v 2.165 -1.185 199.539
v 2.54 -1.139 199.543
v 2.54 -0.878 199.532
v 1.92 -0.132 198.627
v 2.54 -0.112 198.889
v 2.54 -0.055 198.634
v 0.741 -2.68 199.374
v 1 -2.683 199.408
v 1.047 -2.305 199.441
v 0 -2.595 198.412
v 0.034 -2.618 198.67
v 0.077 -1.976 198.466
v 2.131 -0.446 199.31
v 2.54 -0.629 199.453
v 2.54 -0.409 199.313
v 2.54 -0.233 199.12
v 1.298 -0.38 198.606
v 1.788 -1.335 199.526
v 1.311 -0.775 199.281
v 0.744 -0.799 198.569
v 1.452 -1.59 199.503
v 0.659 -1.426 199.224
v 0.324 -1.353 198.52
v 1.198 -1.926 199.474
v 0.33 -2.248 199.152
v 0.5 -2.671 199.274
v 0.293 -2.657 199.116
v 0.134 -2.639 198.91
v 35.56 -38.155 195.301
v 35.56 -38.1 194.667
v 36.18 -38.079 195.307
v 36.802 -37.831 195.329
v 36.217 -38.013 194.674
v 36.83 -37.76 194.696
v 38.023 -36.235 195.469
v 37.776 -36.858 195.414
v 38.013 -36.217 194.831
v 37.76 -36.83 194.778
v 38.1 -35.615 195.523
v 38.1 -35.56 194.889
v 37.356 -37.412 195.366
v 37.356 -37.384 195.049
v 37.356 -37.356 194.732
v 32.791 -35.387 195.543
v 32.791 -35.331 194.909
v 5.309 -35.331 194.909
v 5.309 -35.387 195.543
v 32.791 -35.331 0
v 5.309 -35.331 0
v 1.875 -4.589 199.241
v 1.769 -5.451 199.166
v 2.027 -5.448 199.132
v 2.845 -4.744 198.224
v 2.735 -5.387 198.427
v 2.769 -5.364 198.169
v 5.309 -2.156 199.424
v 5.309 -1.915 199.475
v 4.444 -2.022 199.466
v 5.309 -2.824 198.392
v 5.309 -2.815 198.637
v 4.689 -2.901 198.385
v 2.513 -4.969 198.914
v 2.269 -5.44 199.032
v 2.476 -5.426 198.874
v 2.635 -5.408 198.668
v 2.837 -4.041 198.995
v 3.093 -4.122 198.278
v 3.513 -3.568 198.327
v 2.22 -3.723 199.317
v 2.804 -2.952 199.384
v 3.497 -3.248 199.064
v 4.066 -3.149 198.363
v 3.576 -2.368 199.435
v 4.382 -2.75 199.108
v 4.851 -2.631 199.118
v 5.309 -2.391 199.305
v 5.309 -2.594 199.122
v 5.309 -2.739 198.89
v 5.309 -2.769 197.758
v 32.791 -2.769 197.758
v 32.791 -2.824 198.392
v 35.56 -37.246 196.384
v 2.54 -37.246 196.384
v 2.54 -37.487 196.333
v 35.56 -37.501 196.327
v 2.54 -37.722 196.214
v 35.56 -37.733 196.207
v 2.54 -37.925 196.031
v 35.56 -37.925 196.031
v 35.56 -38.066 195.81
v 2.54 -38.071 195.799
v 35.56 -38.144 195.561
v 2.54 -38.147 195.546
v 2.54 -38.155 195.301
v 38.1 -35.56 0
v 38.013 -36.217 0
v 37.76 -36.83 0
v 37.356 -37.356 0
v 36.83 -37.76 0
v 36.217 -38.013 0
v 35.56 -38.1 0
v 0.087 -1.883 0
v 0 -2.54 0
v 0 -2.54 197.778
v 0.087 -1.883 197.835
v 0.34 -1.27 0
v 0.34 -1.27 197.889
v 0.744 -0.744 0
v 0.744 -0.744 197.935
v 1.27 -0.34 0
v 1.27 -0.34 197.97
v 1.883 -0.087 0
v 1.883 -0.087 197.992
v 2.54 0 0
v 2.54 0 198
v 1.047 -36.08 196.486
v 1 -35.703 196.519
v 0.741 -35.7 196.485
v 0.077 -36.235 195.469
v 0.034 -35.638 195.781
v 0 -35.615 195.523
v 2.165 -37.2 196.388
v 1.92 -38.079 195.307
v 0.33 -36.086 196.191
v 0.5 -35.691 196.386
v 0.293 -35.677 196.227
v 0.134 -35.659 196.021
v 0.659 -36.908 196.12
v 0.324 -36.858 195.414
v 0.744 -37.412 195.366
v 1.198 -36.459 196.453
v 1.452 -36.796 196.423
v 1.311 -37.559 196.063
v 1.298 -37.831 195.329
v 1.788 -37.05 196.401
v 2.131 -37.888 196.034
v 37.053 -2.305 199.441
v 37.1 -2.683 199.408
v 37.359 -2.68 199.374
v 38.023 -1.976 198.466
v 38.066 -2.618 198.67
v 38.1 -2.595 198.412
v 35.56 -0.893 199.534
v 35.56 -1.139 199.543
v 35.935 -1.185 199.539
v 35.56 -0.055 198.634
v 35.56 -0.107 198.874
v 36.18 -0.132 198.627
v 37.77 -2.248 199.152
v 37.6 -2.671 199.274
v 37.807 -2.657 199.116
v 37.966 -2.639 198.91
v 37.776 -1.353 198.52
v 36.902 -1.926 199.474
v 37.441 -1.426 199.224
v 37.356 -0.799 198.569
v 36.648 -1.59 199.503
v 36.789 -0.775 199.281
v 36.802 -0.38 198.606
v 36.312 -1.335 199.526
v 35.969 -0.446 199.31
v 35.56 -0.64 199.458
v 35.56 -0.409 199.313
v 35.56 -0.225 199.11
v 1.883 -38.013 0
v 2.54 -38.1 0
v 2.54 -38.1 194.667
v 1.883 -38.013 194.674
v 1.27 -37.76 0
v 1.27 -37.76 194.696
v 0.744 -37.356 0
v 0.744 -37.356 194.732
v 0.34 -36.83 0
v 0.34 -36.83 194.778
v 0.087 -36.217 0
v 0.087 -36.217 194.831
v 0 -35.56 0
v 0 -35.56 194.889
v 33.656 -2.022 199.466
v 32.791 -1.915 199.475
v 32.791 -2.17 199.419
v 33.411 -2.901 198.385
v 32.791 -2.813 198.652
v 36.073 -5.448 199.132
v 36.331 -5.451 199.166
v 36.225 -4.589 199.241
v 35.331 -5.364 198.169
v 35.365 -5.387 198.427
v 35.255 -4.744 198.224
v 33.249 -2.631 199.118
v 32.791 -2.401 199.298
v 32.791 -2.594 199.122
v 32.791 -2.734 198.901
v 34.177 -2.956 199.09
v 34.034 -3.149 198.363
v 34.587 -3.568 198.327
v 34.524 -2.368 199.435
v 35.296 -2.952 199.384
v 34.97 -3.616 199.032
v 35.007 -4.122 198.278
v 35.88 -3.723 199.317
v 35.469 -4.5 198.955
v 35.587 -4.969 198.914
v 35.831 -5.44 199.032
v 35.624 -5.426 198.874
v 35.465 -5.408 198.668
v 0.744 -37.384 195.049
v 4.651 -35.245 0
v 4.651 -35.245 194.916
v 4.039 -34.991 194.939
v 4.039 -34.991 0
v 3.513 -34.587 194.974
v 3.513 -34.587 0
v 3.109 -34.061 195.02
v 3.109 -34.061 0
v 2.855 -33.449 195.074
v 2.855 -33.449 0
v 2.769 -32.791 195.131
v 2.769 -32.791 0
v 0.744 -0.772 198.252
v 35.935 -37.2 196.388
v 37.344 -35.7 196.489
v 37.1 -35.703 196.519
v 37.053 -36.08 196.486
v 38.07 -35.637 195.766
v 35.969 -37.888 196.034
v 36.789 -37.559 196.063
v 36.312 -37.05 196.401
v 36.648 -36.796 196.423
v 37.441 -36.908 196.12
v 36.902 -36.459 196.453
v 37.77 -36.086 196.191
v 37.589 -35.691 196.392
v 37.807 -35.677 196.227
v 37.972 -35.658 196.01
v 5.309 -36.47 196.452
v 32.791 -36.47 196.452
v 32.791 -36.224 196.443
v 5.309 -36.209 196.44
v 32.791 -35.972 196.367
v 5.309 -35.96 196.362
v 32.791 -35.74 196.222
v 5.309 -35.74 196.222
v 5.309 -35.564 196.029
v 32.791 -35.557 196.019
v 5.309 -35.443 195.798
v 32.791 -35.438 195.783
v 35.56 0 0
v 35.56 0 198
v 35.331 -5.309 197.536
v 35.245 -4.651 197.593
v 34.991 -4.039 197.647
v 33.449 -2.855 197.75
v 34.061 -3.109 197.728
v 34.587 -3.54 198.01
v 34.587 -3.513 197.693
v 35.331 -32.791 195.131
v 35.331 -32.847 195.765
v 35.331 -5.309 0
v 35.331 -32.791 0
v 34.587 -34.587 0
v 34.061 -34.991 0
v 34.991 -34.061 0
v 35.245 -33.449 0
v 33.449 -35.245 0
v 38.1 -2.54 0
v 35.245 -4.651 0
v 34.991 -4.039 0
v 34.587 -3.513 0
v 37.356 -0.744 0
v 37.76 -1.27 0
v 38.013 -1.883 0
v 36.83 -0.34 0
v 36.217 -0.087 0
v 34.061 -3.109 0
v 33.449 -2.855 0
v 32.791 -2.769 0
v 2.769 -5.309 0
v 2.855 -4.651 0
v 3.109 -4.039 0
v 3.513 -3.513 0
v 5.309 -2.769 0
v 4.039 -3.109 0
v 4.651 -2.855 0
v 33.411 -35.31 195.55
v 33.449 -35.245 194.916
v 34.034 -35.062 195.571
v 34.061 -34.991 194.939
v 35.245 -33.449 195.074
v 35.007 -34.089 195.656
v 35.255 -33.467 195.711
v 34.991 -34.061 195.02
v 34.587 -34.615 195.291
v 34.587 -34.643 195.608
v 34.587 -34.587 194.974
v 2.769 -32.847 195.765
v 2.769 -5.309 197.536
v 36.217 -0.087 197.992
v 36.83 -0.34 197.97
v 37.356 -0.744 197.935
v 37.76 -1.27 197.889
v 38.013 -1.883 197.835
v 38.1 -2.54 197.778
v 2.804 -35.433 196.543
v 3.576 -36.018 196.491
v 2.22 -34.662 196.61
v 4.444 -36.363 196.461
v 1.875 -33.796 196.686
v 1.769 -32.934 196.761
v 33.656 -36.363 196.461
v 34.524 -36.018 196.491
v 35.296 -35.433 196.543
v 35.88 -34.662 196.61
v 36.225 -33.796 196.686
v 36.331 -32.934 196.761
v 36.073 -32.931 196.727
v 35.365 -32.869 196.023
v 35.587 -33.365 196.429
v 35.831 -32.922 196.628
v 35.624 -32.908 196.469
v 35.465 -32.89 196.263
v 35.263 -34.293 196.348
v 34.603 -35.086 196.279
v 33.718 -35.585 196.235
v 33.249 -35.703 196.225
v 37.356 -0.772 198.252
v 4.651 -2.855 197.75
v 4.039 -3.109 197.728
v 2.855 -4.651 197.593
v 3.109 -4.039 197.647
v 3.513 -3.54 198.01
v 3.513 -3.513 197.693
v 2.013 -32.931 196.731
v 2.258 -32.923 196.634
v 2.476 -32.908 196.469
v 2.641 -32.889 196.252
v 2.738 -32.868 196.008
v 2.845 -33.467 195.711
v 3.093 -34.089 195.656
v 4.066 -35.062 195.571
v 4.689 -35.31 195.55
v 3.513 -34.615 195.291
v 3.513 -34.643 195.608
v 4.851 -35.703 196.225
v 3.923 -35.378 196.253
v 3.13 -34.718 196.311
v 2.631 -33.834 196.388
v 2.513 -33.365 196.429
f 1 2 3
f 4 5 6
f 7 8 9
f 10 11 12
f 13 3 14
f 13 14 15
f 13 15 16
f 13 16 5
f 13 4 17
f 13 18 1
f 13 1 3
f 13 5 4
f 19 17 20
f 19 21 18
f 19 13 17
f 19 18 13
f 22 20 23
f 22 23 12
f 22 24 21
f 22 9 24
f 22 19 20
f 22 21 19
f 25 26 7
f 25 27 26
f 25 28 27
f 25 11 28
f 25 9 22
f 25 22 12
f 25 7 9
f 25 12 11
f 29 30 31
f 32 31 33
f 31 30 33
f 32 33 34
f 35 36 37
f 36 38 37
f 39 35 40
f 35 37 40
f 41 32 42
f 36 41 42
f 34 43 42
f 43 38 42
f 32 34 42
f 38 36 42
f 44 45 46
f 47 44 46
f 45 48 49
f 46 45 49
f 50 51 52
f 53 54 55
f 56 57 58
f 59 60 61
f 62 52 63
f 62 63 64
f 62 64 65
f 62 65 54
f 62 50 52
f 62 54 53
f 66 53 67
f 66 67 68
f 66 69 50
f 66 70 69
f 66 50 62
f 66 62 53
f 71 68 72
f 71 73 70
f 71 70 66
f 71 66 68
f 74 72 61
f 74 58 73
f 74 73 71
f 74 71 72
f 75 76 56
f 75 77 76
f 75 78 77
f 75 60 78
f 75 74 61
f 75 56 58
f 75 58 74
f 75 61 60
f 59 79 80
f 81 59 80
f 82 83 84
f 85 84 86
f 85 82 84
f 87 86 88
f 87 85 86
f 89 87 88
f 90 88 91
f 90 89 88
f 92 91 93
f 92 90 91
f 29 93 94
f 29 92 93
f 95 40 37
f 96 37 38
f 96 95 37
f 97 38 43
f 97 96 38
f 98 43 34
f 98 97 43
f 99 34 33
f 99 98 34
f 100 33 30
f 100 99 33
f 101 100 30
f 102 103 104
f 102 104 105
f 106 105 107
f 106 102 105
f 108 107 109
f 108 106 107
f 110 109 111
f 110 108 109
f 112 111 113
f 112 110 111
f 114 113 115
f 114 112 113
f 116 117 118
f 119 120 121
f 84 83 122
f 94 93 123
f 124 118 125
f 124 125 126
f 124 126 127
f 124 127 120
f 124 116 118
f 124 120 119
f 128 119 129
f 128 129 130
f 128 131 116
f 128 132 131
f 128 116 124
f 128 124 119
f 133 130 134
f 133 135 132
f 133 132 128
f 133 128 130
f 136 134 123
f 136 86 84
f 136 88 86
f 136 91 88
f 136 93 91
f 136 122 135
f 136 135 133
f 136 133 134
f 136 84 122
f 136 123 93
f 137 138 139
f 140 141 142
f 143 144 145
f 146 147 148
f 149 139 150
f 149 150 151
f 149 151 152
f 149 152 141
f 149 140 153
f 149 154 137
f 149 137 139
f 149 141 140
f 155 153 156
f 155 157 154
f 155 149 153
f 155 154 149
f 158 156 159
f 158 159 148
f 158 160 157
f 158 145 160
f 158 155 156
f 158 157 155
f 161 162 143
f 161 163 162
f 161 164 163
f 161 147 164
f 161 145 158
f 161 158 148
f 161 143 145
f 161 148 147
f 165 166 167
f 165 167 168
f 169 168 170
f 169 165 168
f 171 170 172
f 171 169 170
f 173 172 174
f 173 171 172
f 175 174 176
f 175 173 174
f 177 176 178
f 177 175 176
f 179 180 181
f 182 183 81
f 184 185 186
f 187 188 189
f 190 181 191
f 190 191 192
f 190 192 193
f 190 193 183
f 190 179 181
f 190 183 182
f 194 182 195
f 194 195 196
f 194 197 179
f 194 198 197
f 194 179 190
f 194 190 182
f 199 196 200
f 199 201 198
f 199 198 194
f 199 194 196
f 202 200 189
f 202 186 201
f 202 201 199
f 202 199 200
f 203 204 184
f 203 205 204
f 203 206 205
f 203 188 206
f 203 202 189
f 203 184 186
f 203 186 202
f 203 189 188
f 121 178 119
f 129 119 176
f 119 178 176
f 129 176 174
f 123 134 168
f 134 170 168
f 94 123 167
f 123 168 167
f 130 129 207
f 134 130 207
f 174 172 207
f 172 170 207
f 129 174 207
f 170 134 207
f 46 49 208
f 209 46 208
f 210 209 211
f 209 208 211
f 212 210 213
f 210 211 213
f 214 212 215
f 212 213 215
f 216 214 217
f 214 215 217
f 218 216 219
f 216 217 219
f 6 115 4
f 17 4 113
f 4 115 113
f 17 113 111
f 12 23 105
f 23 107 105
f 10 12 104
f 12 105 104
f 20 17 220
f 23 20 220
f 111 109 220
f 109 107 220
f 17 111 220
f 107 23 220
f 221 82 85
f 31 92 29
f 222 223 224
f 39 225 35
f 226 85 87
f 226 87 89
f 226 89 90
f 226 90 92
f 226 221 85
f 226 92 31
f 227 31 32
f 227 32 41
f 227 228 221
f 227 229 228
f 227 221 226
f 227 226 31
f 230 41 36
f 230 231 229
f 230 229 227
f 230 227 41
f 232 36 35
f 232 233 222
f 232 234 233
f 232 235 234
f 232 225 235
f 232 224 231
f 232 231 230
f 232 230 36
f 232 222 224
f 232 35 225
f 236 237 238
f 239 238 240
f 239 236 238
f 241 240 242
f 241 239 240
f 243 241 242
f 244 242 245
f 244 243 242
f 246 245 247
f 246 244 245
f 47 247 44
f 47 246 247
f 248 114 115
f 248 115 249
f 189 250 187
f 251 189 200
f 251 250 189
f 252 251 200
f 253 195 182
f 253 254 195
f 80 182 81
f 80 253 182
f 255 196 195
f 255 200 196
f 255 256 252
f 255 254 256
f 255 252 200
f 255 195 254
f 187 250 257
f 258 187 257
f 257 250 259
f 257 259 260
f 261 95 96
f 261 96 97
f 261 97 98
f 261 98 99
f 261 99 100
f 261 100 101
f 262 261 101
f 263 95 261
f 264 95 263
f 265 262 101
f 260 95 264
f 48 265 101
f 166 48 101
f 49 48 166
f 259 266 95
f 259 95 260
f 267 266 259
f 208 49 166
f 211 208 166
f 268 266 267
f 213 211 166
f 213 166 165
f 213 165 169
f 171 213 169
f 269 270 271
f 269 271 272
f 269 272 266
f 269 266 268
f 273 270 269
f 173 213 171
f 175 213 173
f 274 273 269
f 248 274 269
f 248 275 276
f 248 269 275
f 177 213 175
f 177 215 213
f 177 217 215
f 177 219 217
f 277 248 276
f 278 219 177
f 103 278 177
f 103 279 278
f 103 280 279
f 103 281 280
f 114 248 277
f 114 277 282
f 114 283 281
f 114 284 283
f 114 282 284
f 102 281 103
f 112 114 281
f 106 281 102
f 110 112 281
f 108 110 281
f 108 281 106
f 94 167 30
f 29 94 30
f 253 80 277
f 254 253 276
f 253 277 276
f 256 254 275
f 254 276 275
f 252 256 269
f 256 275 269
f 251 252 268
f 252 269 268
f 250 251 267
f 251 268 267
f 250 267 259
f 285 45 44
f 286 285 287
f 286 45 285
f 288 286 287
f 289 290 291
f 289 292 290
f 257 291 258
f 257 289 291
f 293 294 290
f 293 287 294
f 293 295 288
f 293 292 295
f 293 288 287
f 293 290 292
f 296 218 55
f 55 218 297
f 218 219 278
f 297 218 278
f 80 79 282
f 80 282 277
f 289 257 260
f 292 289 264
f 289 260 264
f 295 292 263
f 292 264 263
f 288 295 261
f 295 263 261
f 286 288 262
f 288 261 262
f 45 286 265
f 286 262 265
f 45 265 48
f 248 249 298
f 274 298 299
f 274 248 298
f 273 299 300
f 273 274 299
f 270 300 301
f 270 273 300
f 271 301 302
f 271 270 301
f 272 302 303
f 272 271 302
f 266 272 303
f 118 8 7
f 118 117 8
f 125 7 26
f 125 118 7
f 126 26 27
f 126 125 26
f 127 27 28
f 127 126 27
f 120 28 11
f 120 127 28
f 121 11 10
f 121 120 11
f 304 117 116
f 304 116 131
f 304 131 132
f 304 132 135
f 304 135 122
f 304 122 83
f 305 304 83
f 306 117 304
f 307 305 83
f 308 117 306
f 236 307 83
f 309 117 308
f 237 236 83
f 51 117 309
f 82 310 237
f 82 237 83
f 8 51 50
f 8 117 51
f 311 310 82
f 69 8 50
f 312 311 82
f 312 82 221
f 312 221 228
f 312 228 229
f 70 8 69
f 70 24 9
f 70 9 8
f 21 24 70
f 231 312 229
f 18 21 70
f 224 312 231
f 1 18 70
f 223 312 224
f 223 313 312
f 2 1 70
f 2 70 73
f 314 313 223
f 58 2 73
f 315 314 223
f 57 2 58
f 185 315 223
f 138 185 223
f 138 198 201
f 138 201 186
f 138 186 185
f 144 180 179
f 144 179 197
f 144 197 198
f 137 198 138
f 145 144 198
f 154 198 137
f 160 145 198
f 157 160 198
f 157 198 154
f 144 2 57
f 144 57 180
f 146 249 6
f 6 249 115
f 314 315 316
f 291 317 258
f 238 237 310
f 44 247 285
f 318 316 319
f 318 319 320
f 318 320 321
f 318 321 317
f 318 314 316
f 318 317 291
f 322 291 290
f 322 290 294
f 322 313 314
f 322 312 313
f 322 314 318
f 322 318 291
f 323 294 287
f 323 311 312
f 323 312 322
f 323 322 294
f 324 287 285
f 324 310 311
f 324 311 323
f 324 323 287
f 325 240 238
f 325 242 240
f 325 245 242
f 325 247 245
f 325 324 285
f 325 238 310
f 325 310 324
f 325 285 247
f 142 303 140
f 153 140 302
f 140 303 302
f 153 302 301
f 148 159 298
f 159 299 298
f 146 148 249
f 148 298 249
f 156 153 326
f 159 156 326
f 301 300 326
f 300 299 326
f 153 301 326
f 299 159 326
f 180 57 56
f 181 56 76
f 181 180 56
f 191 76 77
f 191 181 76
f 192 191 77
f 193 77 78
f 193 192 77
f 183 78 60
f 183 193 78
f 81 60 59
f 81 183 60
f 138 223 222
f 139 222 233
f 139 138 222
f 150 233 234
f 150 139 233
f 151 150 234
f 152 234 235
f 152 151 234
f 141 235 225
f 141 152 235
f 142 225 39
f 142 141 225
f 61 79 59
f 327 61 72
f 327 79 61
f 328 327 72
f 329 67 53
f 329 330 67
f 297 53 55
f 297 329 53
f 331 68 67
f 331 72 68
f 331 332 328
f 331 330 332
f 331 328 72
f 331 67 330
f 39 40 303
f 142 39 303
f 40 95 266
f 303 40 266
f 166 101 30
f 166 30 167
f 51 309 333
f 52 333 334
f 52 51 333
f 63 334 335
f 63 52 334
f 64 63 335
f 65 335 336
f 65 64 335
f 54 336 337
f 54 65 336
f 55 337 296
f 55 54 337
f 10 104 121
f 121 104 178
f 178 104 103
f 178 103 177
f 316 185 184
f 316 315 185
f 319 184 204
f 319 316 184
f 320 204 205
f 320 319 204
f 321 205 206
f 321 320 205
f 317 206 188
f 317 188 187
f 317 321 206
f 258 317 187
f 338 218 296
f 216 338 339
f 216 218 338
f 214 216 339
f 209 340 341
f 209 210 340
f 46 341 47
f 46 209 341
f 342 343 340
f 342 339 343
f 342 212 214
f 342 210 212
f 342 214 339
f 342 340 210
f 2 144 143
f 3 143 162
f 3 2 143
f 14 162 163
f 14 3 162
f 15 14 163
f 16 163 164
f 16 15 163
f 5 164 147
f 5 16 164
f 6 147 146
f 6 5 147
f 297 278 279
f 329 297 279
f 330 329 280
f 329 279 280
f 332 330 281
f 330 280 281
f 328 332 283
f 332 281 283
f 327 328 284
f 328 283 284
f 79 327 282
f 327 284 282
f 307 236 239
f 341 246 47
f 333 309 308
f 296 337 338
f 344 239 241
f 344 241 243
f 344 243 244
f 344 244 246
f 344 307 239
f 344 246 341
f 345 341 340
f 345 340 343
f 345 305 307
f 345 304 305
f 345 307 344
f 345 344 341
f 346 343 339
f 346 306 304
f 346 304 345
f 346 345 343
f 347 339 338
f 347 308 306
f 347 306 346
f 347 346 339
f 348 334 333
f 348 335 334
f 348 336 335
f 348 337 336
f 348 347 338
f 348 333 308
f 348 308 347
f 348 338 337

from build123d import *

# Parameters (mm, degrees)
BOSS_EXTRUDE1_DEPTH = 198
CUT_EXTRUDE3_DEPTH  = 206.200438596
BOSS_EXTRUDE2_DEPTH = 1.636319424
FILLET1_R           = 1


with BuildPart() as part:
    # Sketch1 → Boss-Extrude1 (new body)
    with BuildSketch(Plane.XY):
        with BuildLine():
            Line((2.54, 0), (35.56, 0))
            ThreePointArc((35.56, 0), (37.356051224, -0.743948776), (38.1, -2.54))
            Line((38.1, -2.54), (38.1, -35.56))
            ThreePointArc((38.1, -35.56), (37.356051224, -37.356051224), (35.56, -38.1))
            Line((35.56, -38.1), (2.54, -38.1))
            ThreePointArc((2.54, -38.1), (0.743948776, -37.356051224), (0, -35.56))
            Line((0, -35.56), (0, -2.54))
            ThreePointArc((0, -2.54), (0.743948776, -0.743948776), (2.54, 0))
        make_face()
        with BuildLine():
            Line((5.3086, -2.7686), (32.7914, -2.7686))
            ThreePointArc((32.7914, -2.7686), (34.587451224, -3.512548776), (35.3314, -5.3086))
            Line((35.3314, -5.3086), (35.3314, -32.7914))
            ThreePointArc((35.3314, -32.7914), (34.587451224, -34.587451224), (32.7914, -35.3314))
            Line((32.7914, -35.3314), (5.3086, -35.3314))
            ThreePointArc((5.3086, -35.3314), (3.512548776, -34.587451224), (2.7686, -32.7914))
            Line((2.7686, -32.7914), (2.7686, -5.3086))
            ThreePointArc((2.7686, -5.3086), (3.512548776, -3.512548776), (5.3086, -2.7686))
        make_face(mode=Mode.SUBTRACT)
    extrude(amount=BOSS_EXTRUDE1_DEPTH)

    # Sketch3 → Cut-Extrude3 (cut, through all)
    with BuildSketch(Plane(origin=(38.1, 0, 0), x_dir=(0, 0, -1), z_dir=(1, 0, 0))):
        Polygon((-198, 0), (-194.66668192, -38.1), (-198, -38.1), align=None)
    extrude(amount=-CUT_EXTRUDE3_DEPTH, mode=Mode.SUBTRACT)

    # Sketch4 → Boss-Extrude2 (add)
    with BuildSketch(Plane(origin=(0, -17.191169589, 196.495967548), x_dir=(1, 0, 0), z_dir=(0, -0.08715574274765185, 0.9961946980917462))):
        with BuildLine():
            Line((2.54, -20.988698746), (35.56, -20.988698746))
            add(Edge.make_bspline(
                [(35.56, -20.988698746), (38.1, -20.988698746), (38.1, -18.438996359)],
                knots=[0, 0, 0, 1.570796327, 1.570796327, 1.570796327], degree=2, weights=[1, 0.707106781, 1]))
            Line((38.1, -18.438996359), (38.1, 14.707134677))
            add(Edge.make_bspline(
                [(38.1, 14.707134677), (38.1, 17.256837064), (35.56, 17.256837064)],
                knots=[4.71238898, 4.71238898, 4.71238898, 6.283185307, 6.283185307, 6.283185307], degree=2, weights=[1, 0.707106781, 1]))
            Line((35.56, 17.256837064), (2.54, 17.256837064))
            add(Edge.make_bspline(
                [(2.54, 17.256837064), (0, 17.256837064), (0, 14.707134677)],
                knots=[3.141592654, 3.141592654, 3.141592654, 4.71238898, 4.71238898, 4.71238898], degree=2, weights=[1, 0.707106781, 1]))
            Line((0, 14.707134677), (0, -18.438996359))
            add(Edge.make_bspline(
                [(0, -18.438996359), (0, -20.988698746), (2.54, -20.988698746)],
                knots=[4.71238898, 4.71238898, 4.71238898, 6.283185307, 6.283185307, 6.283185307], degree=2, weights=[1, 0.707106781, 1]))
        make_face()
        with BuildLine():
            Line((35.3314, 11.927959074), (35.3314, -15.659820757))
            add(Edge.make_bspline(
                [(32.7914, -18.209523144), (35.3314, -18.209523144), (35.3314, -15.659820757)],
                knots=[0, 0, 0, 1.570796327, 1.570796327, 1.570796327], degree=2, weights=[1, 0.707106781, 1]))
            Line((32.7914, -18.209523144), (5.3086, -18.209523144))
            add(Edge.make_bspline(
                [(2.7686, -15.659820757), (2.7686, -18.209523144), (5.3086, -18.209523144)],
                knots=[4.71238898, 4.71238898, 4.71238898, 6.283185307, 6.283185307, 6.283185307], degree=2, weights=[1, 0.707106781, 1]))
            Line((2.7686, -15.659820757), (2.7686, 11.927959074))
            add(Edge.make_bspline(
                [(5.3086, 14.477661462), (2.7686, 14.477661462), (2.7686, 11.927959074)],
                knots=[3.141592654, 3.141592654, 3.141592654, 4.71238898, 4.71238898, 4.71238898], degree=2, weights=[1, 0.707106781, 1]))
            Line((5.3086, 14.477661462), (32.7914, 14.477661462))
            add(Edge.make_bspline(
                [(35.3314, 11.927959074), (35.3314, 14.477661462), (32.7914, 14.477661462)],
                knots=[1.570796327, 1.570796327, 1.570796327, 3.141592654, 3.141592654, 3.141592654], degree=2, weights=[1, 0.707106781, 1]))
        make_face(mode=Mode.SUBTRACT)
    extrude(amount=BOSS_EXTRUDE2_DEPTH)

    # Fillet1
    fillet1_edges = [part.edges().sort_by_distance(p)[0] for p in [
        (35.3314, -19.192614635, 197.963433694),
        (34.589162497, -34.728352955, 196.604232712),
        (19.05, -35.474014635, 196.538995768),
        (3.510837922, -34.728353374, 196.604232675),
        (2.7686, -19.192614635, 197.963433694),
        (3.510837503, -3.656876315, 199.322634677),
        (19.05, -2.911214635, 199.387871621),
        (34.589162078, -3.656875896, 199.322634714),
        (0, -19.192614635, 197.963433694),
        (0.742237922, -37.496953374, 196.362011561),
        (19.05, -38.242614635, 196.296774654),
        (37.357762497, -37.496952955, 196.362011598),
        (38.1, -19.192614635, 197.963433694),
        (37.357762078, -0.888275896, 199.564855827),
        (19.05, -0.142614635, 199.630092735),
        (0.742237503, -0.888276315, 199.564855791),
    ]]
    fillet(fillet1_edges, radius=FILLET1_R)


solid = part.part
